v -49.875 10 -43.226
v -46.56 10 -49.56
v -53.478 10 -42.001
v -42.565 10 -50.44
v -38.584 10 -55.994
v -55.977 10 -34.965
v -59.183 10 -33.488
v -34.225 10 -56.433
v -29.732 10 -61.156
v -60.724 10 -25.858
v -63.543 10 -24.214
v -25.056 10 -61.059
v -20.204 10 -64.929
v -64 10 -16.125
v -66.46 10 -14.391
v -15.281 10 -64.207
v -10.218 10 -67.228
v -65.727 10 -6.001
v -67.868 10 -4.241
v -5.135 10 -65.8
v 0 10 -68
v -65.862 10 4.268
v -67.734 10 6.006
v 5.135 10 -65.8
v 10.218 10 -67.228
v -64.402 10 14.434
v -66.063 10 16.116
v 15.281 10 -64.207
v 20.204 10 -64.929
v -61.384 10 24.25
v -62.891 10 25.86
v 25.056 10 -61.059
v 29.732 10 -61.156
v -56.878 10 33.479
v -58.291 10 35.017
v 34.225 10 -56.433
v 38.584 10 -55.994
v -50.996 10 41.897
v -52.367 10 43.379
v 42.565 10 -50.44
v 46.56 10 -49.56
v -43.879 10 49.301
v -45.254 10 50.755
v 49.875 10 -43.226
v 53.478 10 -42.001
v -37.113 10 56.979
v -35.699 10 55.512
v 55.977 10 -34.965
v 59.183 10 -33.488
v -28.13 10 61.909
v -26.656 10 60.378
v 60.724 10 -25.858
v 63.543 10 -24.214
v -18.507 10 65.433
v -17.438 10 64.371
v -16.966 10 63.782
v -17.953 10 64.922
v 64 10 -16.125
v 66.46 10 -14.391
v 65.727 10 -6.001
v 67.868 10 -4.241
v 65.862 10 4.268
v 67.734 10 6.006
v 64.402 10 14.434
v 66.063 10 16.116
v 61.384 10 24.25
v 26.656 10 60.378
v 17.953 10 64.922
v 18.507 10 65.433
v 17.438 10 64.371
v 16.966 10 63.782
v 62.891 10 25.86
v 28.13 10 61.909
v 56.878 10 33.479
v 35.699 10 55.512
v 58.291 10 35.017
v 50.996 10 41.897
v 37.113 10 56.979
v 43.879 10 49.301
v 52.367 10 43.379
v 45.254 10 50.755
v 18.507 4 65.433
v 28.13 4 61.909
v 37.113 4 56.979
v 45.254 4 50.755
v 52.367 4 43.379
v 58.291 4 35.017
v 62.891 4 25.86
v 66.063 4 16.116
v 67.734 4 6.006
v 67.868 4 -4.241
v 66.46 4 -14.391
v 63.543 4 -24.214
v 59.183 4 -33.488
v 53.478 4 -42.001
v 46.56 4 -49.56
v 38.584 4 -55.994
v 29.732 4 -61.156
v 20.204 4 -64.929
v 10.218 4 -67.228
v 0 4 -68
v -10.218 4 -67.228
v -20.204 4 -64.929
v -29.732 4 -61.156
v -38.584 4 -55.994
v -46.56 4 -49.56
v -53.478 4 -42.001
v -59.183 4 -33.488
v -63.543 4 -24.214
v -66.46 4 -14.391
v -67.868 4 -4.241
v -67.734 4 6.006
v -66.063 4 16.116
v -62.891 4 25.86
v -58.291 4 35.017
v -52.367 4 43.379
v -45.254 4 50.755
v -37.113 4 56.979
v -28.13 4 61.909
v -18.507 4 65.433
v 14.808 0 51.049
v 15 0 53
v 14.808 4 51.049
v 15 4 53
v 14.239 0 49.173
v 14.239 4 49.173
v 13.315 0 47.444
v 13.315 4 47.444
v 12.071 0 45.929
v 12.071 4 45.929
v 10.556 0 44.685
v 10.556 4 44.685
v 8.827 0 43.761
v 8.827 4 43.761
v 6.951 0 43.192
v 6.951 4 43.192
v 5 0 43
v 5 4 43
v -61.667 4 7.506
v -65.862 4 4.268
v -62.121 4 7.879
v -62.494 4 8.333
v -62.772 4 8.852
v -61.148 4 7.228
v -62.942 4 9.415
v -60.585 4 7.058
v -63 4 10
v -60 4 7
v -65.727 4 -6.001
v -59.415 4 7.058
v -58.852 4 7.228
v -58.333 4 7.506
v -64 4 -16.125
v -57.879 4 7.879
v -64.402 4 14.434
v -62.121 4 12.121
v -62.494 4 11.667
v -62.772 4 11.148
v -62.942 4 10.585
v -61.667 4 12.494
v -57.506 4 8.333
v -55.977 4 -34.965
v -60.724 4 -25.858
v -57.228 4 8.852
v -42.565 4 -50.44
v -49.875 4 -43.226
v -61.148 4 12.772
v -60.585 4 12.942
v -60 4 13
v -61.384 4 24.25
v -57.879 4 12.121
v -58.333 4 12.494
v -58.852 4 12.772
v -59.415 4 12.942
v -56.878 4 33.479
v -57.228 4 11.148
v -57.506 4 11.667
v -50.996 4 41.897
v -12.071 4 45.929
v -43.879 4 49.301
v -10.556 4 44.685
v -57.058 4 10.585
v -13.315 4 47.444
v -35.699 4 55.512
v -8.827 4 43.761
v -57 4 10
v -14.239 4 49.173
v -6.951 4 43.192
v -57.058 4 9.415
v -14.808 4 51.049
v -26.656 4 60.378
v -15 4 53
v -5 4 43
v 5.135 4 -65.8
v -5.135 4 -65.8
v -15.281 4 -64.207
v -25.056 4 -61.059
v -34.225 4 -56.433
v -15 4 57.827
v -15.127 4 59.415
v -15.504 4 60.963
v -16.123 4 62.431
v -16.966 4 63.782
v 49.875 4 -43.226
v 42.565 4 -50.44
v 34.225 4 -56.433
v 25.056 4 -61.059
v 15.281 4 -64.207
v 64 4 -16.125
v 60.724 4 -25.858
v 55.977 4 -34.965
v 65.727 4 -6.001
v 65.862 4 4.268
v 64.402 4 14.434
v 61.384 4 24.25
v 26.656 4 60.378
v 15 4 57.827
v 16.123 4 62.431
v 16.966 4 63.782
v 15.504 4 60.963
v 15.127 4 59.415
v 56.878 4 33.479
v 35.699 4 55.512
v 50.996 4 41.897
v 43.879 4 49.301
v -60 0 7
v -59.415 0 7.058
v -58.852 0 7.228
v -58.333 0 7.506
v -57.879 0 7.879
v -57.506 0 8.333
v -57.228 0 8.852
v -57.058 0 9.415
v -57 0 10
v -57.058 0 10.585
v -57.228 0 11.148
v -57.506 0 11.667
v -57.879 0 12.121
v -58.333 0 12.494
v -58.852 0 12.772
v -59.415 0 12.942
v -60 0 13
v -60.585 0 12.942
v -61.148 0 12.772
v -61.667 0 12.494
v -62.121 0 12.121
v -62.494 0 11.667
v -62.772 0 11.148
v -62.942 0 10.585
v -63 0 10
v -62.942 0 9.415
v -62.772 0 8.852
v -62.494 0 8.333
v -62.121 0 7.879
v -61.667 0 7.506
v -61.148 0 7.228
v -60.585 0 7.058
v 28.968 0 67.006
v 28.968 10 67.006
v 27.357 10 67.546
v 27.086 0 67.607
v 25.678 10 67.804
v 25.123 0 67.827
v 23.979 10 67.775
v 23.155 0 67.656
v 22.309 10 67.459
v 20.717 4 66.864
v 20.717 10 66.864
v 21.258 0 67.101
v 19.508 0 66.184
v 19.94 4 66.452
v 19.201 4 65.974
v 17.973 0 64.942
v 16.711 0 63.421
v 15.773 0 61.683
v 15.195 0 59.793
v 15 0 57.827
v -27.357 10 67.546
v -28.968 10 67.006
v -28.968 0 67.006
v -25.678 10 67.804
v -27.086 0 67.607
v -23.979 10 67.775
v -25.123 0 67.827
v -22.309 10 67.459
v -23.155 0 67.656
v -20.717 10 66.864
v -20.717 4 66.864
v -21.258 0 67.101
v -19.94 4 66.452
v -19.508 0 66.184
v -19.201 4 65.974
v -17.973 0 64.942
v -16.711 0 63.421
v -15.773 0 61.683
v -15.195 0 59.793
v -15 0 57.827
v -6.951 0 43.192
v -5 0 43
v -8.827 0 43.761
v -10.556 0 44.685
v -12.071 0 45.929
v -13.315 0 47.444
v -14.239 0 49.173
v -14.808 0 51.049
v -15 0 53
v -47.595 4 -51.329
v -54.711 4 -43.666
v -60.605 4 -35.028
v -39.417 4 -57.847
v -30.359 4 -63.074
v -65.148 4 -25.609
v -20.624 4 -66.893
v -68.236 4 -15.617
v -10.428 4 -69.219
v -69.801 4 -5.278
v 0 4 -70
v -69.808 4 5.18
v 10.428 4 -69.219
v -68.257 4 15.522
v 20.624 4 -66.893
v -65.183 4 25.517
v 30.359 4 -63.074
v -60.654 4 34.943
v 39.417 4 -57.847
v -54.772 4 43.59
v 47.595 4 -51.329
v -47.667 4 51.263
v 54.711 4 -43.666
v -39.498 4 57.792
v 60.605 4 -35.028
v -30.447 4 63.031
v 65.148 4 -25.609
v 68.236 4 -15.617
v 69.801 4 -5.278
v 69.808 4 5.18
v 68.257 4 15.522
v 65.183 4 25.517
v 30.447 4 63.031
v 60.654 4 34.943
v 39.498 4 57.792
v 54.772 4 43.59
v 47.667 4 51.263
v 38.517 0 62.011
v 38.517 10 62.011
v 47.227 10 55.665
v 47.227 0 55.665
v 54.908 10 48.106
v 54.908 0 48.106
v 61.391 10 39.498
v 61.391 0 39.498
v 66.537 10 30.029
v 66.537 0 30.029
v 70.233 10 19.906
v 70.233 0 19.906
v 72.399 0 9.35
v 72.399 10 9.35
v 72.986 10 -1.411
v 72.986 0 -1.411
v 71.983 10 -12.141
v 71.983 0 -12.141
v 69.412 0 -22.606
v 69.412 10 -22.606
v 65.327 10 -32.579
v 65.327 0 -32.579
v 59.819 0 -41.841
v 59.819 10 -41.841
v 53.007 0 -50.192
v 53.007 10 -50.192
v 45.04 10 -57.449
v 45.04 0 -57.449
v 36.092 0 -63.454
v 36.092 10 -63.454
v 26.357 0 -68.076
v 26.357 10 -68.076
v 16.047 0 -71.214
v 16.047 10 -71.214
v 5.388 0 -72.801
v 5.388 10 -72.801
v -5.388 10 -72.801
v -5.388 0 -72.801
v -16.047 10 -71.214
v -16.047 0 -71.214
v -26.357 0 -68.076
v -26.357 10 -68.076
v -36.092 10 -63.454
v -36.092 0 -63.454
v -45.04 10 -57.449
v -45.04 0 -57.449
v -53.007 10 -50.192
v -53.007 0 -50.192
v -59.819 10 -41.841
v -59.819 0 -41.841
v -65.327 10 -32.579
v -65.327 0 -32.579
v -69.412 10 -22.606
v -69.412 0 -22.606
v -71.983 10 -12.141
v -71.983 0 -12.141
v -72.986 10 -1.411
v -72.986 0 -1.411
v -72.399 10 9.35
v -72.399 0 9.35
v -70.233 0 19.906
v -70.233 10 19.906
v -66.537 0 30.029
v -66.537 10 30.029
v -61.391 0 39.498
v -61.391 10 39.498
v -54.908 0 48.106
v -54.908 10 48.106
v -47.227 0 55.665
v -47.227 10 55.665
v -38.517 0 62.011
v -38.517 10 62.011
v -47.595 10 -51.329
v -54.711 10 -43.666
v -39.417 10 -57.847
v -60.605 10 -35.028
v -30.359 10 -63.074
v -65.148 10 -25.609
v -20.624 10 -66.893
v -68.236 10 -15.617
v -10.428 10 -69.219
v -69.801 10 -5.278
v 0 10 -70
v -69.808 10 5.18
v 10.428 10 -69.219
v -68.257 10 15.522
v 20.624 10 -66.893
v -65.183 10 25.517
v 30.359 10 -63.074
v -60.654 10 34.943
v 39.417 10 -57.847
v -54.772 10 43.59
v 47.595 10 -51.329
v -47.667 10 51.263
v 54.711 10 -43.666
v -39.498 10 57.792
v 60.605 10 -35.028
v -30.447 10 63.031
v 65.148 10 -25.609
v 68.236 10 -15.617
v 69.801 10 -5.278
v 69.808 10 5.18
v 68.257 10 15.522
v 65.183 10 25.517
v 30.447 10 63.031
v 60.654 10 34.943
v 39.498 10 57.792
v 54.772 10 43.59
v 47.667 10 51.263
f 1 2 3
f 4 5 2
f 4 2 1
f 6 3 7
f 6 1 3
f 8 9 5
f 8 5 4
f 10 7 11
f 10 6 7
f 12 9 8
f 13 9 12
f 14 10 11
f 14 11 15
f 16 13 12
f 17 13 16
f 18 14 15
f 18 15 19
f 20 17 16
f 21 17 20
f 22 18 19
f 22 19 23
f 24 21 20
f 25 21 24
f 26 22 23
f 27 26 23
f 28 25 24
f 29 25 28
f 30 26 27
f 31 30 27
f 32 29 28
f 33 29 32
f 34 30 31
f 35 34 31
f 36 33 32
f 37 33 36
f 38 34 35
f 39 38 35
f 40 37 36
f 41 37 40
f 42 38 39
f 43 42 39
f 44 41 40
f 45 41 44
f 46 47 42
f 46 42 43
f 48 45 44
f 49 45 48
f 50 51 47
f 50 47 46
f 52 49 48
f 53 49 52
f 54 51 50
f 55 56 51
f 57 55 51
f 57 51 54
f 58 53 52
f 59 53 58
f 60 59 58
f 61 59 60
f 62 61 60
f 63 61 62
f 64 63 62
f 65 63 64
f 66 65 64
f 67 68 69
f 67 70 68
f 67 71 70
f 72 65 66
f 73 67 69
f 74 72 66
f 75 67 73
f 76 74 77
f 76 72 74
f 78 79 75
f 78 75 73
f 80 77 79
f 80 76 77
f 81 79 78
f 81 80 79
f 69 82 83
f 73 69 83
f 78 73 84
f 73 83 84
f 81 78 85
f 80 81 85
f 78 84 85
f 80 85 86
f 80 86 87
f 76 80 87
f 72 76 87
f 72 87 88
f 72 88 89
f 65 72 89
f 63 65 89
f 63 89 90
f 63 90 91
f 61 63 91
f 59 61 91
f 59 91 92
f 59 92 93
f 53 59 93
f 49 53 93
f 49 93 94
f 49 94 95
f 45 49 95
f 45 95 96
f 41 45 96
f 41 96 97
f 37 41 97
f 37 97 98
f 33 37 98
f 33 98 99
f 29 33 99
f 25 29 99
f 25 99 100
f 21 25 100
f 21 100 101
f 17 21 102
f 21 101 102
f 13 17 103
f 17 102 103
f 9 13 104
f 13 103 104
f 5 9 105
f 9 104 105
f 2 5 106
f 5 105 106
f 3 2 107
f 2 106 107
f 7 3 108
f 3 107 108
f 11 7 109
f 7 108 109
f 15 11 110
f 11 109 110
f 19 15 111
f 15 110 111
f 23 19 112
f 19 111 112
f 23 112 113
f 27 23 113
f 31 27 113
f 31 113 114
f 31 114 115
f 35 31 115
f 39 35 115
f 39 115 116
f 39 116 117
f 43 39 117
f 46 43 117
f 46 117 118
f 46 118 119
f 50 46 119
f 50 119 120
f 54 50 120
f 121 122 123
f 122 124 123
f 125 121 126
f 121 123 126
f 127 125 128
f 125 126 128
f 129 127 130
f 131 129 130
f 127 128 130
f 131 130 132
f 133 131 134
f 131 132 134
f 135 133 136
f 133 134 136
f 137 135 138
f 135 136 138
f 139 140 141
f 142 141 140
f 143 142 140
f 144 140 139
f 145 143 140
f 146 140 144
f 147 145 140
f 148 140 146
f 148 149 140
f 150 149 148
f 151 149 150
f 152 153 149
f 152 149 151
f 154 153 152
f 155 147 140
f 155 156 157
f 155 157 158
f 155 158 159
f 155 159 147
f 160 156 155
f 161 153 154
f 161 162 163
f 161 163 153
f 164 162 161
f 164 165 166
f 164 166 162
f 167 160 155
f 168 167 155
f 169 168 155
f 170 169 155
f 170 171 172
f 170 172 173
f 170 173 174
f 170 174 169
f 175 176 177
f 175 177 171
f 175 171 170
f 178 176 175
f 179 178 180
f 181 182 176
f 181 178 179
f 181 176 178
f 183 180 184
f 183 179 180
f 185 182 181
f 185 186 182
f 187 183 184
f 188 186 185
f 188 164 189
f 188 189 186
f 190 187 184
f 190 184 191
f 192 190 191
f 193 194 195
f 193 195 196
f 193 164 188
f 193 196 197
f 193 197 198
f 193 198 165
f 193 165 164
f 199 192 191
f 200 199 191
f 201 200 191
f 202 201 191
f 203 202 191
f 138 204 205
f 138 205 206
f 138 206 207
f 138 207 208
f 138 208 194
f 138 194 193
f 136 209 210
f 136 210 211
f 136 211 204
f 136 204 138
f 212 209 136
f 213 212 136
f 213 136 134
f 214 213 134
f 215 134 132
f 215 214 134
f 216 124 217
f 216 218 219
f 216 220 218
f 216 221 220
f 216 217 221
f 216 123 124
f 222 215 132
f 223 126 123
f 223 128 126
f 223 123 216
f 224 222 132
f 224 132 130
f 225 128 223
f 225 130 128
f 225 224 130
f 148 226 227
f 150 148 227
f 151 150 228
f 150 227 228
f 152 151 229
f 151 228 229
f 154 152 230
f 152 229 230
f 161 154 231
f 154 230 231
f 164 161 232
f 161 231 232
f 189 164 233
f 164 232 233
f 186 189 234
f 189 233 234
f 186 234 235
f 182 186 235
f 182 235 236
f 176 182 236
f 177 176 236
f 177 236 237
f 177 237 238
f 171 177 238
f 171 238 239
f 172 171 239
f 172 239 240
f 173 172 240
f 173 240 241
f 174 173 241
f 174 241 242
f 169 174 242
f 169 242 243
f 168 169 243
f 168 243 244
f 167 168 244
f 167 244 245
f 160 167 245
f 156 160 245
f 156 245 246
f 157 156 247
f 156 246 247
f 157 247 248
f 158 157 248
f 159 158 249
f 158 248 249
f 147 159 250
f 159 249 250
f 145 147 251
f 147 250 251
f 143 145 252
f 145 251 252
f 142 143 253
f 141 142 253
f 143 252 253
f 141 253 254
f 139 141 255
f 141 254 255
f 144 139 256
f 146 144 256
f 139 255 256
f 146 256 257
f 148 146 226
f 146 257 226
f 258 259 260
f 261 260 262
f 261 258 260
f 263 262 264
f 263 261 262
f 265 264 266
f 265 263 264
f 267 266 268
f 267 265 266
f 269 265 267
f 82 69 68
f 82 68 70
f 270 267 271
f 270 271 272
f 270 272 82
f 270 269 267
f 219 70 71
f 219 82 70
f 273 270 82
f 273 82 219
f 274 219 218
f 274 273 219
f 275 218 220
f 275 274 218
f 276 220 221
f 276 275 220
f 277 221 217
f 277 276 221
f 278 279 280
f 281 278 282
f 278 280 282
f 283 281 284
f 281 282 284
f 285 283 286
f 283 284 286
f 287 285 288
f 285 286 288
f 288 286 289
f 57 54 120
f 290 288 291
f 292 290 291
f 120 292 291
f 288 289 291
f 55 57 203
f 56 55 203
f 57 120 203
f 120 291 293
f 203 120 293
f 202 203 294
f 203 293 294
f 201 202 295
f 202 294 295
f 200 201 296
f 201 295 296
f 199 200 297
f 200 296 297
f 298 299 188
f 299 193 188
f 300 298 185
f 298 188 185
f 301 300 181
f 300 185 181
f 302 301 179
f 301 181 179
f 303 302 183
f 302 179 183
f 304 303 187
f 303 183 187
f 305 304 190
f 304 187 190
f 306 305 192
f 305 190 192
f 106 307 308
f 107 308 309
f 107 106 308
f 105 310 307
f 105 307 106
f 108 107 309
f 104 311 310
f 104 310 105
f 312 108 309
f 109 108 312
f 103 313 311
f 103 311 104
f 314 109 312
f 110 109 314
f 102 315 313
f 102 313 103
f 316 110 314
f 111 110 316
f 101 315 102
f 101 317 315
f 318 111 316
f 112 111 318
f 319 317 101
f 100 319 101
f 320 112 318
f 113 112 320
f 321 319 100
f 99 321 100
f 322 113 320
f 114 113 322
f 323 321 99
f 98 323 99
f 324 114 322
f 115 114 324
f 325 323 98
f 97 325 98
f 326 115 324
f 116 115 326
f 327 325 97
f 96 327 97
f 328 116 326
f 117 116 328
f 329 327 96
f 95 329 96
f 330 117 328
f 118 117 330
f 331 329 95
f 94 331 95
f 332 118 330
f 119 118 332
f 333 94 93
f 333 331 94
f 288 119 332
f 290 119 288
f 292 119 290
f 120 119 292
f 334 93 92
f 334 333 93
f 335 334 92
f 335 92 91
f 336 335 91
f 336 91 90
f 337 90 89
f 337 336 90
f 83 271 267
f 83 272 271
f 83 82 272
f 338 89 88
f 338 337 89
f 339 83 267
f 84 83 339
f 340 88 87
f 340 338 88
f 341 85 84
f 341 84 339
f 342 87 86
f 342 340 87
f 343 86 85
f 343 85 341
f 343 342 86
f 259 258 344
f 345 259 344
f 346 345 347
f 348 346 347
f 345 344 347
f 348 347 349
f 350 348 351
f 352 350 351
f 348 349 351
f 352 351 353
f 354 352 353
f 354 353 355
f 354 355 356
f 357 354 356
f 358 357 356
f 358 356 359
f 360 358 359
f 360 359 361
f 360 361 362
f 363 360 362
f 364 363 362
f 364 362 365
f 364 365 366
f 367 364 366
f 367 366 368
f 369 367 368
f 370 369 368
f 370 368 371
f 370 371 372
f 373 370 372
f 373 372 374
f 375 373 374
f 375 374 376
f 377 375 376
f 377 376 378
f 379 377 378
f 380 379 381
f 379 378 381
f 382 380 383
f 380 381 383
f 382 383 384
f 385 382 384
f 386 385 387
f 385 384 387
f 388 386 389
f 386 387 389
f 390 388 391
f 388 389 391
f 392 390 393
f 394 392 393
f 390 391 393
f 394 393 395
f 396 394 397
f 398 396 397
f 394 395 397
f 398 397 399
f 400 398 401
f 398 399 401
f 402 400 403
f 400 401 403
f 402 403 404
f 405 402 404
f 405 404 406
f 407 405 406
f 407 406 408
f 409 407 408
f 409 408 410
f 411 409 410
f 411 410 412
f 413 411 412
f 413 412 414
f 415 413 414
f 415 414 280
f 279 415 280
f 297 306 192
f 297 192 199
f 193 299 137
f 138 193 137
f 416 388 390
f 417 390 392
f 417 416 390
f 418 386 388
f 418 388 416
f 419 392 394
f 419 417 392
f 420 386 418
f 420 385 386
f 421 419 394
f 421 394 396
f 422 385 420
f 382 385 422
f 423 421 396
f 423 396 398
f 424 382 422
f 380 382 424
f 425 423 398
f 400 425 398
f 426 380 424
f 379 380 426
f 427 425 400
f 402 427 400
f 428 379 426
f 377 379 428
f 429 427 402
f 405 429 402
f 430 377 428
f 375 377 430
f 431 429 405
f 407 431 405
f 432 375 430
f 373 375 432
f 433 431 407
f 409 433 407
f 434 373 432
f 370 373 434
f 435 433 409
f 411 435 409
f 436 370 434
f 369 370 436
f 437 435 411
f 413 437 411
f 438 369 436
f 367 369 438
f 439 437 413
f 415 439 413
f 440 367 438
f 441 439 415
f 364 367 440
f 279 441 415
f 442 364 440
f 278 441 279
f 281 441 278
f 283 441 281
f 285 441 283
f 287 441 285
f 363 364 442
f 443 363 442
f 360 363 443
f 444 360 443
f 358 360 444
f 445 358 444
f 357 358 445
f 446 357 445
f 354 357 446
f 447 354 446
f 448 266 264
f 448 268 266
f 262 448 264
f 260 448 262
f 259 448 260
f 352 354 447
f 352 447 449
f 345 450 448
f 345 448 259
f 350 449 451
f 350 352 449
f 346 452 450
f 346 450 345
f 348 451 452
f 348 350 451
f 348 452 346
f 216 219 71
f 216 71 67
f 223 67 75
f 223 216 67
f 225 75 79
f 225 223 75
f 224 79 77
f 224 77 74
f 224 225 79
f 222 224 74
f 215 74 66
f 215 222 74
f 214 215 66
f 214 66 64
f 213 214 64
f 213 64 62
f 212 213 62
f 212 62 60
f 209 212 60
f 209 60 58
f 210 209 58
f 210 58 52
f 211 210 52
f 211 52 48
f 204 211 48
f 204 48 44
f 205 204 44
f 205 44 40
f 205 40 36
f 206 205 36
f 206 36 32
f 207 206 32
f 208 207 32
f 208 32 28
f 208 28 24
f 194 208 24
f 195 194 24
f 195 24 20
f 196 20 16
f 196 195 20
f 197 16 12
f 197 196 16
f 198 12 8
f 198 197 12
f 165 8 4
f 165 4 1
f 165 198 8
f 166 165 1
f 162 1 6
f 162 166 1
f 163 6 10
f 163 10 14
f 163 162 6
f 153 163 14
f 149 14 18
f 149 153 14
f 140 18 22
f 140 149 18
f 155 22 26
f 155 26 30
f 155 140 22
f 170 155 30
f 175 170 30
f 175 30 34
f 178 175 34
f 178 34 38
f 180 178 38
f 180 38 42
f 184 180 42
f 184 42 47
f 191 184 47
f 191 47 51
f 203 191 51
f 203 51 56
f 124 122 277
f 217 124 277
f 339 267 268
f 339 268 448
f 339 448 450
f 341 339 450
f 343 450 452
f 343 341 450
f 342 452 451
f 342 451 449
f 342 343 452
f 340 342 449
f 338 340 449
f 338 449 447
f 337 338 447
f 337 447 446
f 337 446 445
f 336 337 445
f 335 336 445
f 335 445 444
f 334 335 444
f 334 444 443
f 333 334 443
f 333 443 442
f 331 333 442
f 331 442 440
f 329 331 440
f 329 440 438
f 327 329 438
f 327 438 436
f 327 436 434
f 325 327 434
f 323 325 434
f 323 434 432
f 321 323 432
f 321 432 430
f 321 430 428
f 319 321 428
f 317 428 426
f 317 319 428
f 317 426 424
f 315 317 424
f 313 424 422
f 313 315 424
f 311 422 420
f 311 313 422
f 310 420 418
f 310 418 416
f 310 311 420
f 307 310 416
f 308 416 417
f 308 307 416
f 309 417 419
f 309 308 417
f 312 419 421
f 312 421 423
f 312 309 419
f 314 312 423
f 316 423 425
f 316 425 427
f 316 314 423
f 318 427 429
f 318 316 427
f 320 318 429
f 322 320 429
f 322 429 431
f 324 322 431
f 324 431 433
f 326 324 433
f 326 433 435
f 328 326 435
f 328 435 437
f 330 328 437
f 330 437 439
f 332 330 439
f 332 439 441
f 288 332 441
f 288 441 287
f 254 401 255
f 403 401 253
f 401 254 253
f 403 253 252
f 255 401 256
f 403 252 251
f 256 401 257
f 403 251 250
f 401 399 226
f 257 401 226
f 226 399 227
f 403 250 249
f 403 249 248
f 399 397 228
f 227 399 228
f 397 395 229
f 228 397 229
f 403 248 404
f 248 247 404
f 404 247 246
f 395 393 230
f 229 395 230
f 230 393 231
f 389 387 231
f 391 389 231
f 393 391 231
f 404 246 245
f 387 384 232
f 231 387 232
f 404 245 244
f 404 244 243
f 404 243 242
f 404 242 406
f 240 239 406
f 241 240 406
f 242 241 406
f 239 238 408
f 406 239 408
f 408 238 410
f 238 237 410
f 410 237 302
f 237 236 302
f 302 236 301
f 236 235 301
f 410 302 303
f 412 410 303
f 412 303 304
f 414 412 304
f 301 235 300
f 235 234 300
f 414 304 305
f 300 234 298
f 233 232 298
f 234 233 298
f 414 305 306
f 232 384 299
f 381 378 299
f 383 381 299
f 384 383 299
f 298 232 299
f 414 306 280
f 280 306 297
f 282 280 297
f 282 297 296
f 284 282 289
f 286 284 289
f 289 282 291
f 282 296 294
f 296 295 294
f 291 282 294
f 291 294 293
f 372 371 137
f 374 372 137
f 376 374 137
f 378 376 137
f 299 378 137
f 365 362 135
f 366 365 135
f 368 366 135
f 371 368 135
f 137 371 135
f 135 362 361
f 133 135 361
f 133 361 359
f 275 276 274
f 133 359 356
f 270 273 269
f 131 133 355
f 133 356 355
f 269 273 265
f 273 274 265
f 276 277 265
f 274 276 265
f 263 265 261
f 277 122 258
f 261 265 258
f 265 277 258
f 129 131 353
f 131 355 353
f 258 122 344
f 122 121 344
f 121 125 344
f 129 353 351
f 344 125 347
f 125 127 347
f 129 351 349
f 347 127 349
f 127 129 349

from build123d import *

# Parameters (mm, degrees)
SKETCH1_R           = 73
BOSS_EXTRUDE1_DEPTH = 4
SKETCH2_R           = 73
SKETCH2_R_2         = 70
SKETCH2_R_3         = 68
SKETCH2_R_4         = 66
BOSS_EXTRUDE2_DEPTH = 6
CUT_EXTRUDE1_REACH  = 105.721
SKETCH4_W           = 30
SKETCH4_H           = 30
FILLET1_R           = 10
FILLET2_R           = 10
CUT_EXTRUDE2_REACH  = 105.721
SKETCH6_R           = 3


with BuildPart() as part:
    # Sketch1 → Boss-Extrude1 (new body)
    with BuildSketch(Plane(origin=(0, 0, 0), x_dir=(1, 0, 0), z_dir=(0, 1, 0))):
        with Locations(Location((0, 0, 0), (0, 0, 270))):
            Circle(SKETCH1_R)
    extrude(amount=BOSS_EXTRUDE1_DEPTH)

    # Sketch2 → Boss-Extrude2 (add)
    with BuildSketch(Plane(origin=(0, 4, 0), x_dir=(1, 0, 0), z_dir=(0, 1, 0))):
        with Locations(Location((0, 0, 0), (0, 0, 270))):
            Circle(SKETCH2_R)
        with Locations(Location((0, 0, 0), (0, 0, 270))):
            Circle(SKETCH2_R_2, mode=Mode.SUBTRACT)
        with Locations(Location((0, 0, 0), (0, 0, 270))):
            Circle(SKETCH2_R_3)
        with Locations(Location((0, 0, 0), (0, 0, 270))):
            Circle(SKETCH2_R_4, mode=Mode.SUBTRACT)
    extrude(amount=BOSS_EXTRUDE2_DEPTH)

    # Sketch4 → Cut-Extrude1 (cut, up to next)
    with BuildSketch(Plane.XZ, mode=Mode.PRIVATE) as cut_extrude1_sk1:
        with Locations((0, 58)):
            Rectangle(SKETCH4_W, SKETCH4_H)
    cut_extrude1_tool1 = extrude(cut_extrude1_sk1.sketch, amount=-CUT_EXTRUDE1_REACH, mode=Mode.PRIVATE) & part.part
    add(cut_extrude1_tool1.solids().sort_by_distance((0, 0, 58))[0], mode=Mode.SUBTRACT)

    # Fillet1
    fillet1_edges = [part.edges().sort_by_distance(p)[0] for p in [
        (15, 5, 71.442284398),
        (-15, 5, 71.442284398),
    ]]
    fillet(fillet1_edges, radius=FILLET1_R)

    # Fillet2
    fillet2_edges = [part.edges().sort_by_distance(p)[0] for p in [
        (-15, 2, 43),
        (15, 2, 43),
    ]]
    fillet(fillet2_edges, radius=FILLET2_R)

    # Sketch6 → Cut-Extrude2 (cut, up to next)
    with BuildSketch(Plane.XZ, mode=Mode.PRIVATE) as cut_extrude2_sk1:
        with Locations(Location((-60, 10, 0), (0, 0, 270))):
            Circle(SKETCH6_R)
    cut_extrude2_tool1 = extrude(cut_extrude2_sk1.sketch, amount=-CUT_EXTRUDE2_REACH, mode=Mode.PRIVATE) & part.part
    add(cut_extrude2_tool1.solids().sort_by_distance((-60, 0, 10))[0], mode=Mode.SUBTRACT)


solid = part.part
